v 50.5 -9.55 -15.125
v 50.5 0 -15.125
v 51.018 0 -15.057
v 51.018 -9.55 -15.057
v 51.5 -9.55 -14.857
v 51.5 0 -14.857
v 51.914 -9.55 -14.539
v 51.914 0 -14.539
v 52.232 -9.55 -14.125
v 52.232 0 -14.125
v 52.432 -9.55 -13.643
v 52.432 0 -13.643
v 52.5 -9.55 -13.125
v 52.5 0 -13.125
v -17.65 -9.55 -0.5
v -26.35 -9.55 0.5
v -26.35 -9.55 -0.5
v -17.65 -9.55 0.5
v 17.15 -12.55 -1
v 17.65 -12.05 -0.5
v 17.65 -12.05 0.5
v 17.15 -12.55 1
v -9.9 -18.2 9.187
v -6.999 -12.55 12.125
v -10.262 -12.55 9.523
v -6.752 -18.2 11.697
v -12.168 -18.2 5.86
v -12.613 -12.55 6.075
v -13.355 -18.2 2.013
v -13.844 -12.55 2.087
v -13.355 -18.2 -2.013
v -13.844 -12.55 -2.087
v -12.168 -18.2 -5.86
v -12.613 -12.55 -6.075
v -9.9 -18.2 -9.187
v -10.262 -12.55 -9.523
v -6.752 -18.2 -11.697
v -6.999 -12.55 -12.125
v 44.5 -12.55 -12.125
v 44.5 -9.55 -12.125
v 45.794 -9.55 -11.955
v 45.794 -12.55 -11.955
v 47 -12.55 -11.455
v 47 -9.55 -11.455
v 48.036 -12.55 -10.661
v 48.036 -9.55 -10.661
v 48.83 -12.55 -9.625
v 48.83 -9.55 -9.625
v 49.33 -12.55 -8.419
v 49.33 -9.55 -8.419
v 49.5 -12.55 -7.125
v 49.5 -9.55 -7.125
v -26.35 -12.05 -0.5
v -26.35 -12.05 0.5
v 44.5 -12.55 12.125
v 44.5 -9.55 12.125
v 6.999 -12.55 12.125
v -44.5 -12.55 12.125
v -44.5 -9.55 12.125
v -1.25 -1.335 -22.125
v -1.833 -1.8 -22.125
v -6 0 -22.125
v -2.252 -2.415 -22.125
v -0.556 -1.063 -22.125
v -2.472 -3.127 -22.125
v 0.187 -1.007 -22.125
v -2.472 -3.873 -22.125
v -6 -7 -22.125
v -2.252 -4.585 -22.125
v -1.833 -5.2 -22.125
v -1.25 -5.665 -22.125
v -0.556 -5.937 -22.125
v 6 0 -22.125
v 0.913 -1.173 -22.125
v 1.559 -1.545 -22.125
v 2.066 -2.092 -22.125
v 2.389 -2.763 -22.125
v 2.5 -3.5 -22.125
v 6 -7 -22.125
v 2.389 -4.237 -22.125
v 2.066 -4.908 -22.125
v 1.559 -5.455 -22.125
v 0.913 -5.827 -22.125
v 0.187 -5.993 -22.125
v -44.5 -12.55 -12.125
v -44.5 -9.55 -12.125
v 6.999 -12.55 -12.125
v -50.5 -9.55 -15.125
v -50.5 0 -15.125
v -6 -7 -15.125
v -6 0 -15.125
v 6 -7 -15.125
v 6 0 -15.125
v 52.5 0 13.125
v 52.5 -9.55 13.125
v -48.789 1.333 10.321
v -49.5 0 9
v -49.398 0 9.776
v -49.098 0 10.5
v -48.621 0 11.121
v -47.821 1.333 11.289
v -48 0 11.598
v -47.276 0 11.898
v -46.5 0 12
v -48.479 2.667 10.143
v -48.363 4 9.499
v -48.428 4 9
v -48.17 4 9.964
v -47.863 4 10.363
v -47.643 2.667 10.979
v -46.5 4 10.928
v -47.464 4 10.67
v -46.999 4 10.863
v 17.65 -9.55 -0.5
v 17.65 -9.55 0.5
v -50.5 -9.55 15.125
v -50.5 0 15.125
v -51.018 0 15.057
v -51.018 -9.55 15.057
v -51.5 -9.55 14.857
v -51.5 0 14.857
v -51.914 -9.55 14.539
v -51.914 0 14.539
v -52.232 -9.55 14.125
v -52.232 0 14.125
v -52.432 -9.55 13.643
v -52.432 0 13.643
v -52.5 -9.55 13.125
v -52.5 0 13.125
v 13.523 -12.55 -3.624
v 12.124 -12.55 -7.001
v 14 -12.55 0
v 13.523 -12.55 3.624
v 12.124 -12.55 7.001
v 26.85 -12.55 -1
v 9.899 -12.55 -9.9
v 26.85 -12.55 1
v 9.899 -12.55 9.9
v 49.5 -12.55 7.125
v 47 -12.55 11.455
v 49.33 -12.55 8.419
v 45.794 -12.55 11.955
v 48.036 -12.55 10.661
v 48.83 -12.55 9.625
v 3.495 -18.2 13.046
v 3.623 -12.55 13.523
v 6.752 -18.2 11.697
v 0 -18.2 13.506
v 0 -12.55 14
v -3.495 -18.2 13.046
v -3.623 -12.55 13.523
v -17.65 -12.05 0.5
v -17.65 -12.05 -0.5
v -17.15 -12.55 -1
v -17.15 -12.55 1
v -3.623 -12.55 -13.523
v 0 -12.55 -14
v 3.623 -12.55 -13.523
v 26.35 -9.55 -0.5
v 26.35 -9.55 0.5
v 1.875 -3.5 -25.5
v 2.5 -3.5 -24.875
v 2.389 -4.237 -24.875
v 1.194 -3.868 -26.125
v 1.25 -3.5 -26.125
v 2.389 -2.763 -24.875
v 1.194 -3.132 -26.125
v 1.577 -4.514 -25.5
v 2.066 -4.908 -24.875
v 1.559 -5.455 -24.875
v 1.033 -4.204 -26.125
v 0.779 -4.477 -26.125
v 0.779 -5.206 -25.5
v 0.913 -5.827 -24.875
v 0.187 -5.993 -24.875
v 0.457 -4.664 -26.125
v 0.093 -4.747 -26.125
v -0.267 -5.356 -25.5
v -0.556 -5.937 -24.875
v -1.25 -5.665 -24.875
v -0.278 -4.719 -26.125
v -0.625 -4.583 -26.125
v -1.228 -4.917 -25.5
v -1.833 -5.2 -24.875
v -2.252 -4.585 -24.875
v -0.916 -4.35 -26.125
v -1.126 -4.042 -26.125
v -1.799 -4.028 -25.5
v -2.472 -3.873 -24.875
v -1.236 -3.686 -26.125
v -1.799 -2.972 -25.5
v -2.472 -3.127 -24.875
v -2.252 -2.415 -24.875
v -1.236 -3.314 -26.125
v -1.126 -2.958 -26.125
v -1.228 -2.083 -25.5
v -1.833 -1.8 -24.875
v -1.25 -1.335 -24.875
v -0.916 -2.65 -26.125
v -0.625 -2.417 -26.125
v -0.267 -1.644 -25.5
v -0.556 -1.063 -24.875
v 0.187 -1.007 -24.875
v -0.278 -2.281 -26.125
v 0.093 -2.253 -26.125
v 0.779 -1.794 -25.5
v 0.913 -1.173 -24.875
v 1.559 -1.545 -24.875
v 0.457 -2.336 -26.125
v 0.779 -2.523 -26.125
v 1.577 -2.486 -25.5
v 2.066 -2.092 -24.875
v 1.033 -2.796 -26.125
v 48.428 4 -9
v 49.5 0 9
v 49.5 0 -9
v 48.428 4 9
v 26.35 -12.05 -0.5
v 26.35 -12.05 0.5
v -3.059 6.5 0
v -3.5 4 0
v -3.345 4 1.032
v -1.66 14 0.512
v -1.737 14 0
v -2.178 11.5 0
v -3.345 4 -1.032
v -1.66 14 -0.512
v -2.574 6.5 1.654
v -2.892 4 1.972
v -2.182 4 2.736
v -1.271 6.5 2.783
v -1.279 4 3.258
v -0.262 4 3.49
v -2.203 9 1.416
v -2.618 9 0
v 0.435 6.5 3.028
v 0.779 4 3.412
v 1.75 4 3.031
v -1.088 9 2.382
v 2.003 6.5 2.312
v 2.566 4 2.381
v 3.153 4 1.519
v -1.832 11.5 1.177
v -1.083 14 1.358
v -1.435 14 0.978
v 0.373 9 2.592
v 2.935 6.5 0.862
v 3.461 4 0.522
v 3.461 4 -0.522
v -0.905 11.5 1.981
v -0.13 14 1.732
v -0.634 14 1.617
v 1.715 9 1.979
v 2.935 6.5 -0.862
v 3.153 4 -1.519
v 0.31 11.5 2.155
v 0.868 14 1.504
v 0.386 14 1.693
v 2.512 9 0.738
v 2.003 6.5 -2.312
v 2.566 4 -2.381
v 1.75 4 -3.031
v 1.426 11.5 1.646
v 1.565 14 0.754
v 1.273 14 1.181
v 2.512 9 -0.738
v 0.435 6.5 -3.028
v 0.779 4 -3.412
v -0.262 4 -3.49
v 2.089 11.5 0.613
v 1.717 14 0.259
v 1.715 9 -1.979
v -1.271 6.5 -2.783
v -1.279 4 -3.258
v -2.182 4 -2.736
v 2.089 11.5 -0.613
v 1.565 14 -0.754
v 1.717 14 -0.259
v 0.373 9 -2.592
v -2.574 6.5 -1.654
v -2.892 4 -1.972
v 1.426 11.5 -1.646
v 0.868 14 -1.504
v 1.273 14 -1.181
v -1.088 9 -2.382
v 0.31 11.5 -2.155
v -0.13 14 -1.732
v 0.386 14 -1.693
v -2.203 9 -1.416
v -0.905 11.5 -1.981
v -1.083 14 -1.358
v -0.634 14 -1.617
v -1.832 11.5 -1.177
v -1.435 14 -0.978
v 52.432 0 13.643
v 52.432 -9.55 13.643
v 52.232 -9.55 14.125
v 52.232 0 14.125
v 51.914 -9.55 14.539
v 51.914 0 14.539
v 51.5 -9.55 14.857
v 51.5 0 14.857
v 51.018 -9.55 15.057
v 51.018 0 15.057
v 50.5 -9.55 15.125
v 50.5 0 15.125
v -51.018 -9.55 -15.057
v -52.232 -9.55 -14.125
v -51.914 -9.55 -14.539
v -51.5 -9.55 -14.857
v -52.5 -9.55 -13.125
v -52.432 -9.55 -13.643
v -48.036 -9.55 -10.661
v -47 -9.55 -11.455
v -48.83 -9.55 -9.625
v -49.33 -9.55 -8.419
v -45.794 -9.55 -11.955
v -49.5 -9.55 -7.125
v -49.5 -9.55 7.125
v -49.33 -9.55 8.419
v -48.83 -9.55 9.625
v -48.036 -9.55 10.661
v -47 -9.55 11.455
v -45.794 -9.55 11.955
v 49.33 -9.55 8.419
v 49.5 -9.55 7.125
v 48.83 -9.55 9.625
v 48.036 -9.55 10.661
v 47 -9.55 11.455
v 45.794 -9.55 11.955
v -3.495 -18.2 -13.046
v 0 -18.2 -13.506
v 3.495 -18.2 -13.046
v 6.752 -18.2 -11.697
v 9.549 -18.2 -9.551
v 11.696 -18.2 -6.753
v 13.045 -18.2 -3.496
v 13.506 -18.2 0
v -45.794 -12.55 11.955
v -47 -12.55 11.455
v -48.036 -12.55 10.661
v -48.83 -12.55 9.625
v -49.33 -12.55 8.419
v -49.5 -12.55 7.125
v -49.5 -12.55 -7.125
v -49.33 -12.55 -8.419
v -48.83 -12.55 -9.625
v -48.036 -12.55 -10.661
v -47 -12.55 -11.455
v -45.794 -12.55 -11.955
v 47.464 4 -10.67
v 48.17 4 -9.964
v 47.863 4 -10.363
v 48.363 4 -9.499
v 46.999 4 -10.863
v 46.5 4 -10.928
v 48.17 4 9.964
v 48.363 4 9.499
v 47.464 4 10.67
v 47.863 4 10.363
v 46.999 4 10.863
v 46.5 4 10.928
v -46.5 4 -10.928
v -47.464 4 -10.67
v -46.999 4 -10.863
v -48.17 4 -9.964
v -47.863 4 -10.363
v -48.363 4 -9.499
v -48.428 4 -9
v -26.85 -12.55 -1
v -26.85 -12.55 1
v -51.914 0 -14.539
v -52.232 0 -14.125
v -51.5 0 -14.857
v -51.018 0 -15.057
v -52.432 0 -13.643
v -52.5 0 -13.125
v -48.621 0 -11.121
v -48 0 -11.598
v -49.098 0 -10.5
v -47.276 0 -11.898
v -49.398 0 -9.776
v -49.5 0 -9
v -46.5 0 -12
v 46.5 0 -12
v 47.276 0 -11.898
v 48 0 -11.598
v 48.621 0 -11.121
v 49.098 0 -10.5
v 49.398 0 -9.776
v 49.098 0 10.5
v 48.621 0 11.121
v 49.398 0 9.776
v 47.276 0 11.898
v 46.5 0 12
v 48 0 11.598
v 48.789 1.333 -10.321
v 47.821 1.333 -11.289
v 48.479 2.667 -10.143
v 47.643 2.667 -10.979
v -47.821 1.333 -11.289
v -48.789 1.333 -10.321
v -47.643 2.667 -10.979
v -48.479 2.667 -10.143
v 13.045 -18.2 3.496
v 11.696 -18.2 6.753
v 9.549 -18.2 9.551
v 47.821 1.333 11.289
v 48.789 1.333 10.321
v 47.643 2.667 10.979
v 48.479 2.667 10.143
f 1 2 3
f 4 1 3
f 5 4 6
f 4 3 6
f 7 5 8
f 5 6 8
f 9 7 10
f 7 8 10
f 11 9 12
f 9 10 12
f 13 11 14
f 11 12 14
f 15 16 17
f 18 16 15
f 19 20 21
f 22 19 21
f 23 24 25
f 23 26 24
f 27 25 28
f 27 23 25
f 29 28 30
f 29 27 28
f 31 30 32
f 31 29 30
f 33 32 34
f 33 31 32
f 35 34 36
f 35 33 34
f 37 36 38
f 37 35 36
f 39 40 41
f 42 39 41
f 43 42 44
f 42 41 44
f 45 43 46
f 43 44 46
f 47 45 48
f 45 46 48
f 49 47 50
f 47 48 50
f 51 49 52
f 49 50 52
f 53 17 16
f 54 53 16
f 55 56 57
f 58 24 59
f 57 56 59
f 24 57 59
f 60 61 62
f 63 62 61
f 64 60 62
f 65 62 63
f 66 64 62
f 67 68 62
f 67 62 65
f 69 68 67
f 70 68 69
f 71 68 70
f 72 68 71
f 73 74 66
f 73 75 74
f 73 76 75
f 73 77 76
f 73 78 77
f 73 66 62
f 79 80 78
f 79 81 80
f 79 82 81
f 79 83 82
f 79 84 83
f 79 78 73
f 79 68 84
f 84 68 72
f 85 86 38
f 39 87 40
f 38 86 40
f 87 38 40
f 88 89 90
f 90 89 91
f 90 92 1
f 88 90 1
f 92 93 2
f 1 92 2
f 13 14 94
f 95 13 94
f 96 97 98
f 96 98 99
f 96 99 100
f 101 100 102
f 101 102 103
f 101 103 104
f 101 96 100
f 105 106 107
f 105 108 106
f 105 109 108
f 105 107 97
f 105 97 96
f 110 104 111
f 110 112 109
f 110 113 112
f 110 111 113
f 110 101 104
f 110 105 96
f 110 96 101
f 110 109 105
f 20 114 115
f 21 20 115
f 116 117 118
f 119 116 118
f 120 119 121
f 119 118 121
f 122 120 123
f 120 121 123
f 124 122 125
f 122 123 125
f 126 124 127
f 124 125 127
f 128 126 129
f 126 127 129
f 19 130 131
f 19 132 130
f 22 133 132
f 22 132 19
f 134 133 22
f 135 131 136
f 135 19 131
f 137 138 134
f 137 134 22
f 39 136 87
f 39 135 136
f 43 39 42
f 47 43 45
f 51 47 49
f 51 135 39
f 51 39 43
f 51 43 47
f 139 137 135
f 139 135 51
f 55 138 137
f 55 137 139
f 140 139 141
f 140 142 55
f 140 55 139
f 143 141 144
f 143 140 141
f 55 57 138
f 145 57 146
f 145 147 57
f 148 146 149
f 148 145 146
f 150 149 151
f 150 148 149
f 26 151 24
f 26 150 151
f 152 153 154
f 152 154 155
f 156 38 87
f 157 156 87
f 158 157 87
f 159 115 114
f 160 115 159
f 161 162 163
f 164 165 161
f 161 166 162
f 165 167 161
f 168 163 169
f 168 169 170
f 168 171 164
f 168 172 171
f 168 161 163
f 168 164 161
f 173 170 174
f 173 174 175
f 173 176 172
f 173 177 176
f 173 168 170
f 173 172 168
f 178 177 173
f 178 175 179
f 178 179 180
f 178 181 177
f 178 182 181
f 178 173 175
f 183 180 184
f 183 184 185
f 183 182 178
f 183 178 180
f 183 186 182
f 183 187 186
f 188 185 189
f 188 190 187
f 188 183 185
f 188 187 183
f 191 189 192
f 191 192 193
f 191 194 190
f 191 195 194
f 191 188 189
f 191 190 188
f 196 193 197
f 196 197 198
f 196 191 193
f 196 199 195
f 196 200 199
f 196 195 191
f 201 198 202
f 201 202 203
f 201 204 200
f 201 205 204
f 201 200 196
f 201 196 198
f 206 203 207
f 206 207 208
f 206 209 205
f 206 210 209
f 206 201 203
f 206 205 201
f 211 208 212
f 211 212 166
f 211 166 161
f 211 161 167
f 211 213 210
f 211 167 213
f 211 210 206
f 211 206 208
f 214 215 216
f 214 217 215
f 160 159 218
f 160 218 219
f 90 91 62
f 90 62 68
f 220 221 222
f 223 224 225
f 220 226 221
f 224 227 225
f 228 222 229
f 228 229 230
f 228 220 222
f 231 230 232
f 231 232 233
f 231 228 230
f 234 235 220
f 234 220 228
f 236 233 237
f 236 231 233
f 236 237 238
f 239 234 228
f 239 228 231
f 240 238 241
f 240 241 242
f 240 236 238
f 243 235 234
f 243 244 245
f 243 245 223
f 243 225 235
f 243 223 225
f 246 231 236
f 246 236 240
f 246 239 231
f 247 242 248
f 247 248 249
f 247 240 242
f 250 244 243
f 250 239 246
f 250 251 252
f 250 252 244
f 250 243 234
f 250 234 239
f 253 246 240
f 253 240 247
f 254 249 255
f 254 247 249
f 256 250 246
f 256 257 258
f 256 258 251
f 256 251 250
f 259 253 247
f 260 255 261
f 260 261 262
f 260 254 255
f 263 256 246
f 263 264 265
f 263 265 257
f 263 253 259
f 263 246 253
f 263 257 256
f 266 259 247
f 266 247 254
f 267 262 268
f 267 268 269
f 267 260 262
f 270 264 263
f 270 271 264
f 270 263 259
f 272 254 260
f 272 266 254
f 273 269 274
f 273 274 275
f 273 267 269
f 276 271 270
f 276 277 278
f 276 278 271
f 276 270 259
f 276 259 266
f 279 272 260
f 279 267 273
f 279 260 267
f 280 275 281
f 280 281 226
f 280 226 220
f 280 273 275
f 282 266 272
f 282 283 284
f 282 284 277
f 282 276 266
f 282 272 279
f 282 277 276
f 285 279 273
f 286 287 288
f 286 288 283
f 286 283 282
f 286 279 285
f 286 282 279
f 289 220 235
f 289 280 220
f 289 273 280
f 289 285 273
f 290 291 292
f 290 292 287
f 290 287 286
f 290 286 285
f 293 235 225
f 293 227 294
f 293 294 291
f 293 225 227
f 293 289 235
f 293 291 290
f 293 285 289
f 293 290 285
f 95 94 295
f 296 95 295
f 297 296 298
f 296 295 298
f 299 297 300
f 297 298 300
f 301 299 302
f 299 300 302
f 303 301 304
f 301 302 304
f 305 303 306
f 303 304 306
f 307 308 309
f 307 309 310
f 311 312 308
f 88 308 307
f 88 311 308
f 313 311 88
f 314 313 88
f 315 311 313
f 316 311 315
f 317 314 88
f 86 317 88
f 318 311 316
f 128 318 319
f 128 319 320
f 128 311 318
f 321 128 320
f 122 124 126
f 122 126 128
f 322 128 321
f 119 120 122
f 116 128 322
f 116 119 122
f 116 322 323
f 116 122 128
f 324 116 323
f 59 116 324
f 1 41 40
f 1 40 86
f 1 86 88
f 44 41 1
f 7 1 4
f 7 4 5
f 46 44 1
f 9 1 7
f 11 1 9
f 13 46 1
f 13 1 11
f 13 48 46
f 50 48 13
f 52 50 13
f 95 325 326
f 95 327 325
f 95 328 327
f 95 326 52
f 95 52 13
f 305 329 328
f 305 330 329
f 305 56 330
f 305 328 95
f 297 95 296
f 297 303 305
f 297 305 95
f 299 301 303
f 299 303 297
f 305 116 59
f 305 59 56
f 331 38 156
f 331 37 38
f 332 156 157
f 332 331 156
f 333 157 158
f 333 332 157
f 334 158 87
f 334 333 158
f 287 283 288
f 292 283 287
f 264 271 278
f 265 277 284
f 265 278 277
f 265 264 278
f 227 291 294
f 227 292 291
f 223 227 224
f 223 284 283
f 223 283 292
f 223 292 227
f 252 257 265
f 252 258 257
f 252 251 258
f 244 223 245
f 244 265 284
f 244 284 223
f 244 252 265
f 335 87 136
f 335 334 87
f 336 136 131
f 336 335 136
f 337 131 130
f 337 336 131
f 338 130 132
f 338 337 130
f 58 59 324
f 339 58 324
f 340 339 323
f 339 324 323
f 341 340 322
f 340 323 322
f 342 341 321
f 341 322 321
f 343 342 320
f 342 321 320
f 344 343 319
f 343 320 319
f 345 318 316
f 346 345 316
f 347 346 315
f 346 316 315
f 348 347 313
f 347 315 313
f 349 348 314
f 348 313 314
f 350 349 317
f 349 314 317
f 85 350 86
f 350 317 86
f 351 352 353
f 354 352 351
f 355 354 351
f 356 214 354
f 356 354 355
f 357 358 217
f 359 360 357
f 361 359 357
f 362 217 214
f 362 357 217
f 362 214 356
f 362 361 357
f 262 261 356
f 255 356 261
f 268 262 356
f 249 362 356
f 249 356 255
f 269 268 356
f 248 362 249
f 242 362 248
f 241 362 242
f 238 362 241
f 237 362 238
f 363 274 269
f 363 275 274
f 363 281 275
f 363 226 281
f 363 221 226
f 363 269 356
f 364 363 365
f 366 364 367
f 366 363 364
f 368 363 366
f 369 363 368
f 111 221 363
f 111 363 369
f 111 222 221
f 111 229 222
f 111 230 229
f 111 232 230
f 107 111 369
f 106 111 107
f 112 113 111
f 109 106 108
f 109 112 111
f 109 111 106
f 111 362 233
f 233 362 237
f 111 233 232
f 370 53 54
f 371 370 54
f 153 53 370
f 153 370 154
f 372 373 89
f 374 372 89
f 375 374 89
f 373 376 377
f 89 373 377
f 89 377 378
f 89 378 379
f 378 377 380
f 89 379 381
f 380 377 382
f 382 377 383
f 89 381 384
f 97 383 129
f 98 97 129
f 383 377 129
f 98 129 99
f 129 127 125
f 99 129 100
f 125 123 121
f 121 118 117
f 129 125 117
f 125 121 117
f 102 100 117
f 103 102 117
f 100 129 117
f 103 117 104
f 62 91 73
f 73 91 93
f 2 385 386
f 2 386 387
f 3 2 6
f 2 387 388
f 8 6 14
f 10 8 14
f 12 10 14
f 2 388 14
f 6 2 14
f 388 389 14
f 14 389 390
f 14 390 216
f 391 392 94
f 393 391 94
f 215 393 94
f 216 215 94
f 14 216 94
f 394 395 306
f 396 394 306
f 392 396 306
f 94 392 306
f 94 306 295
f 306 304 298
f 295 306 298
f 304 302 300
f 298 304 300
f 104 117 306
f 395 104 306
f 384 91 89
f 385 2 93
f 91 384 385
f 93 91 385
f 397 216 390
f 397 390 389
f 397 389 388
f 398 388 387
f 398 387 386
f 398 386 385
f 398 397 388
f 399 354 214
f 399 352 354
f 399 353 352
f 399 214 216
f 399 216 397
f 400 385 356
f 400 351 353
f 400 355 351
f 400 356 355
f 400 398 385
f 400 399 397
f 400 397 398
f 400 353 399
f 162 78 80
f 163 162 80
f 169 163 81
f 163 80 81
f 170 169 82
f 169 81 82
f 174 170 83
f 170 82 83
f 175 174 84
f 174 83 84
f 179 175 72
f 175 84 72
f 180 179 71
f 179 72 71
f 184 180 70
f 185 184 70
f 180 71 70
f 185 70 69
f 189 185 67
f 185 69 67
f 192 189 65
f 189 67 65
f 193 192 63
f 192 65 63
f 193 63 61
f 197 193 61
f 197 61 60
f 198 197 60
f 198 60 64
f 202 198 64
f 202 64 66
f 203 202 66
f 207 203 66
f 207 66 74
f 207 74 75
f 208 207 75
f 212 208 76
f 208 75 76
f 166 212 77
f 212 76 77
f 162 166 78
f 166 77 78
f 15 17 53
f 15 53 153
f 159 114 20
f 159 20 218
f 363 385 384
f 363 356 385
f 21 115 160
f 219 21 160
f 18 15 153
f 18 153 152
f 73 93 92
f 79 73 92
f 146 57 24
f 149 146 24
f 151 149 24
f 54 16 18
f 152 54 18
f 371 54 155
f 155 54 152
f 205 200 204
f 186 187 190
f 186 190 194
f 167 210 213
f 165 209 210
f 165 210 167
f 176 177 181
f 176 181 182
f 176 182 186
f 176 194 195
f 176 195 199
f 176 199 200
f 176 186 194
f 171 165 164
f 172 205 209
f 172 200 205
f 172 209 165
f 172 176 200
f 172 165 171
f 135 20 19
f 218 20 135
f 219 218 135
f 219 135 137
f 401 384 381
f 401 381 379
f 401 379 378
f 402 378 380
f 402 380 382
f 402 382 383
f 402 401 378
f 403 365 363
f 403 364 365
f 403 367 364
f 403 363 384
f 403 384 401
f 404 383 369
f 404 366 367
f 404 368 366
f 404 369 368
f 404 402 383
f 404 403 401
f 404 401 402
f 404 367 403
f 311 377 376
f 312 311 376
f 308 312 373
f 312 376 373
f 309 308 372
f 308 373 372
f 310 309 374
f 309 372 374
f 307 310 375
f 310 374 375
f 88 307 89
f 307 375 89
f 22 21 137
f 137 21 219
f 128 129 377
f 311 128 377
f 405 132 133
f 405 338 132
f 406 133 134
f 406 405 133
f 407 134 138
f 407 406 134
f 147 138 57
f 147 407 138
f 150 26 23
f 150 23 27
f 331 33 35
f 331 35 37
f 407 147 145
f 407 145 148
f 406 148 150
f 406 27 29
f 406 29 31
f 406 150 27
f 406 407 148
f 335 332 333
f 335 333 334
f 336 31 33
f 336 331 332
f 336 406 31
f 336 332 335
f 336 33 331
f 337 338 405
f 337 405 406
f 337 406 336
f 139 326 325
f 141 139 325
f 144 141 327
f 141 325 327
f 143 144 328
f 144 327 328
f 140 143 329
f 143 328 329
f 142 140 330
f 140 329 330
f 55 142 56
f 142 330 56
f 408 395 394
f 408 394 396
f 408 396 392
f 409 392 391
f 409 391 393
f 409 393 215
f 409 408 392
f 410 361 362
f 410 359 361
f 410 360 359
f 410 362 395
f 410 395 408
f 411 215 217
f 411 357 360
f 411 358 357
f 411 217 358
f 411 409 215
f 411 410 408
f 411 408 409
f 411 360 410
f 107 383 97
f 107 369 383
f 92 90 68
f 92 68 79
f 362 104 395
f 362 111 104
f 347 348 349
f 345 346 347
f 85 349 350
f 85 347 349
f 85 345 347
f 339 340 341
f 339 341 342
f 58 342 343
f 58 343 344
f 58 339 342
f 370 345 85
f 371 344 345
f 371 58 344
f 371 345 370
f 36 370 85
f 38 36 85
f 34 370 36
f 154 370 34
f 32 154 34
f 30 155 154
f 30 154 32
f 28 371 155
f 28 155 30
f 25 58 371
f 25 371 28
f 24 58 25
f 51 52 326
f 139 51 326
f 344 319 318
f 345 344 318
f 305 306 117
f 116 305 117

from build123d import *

# Parameters (mm, degrees)
F1_DEPTH  = 9.55
F2_W      = 8.7
F2_H      = 1
F3_DEPTH  = 3
F4_SIZE   = 0.5
F6_DEPTH  = 5.65
F6_TAPER  = 5
F8_DEPTH  = 4
F8_TAPER  = 15
F9_W      = 12
F9_H      = 7
F10_DEPTH = 7
F11_R     = 3.5
F12_DEPTH = 10
F12_TAPER = 10
F13_R     = 2.5
F14_DEPTH = 4
F15_SIZE  = 1.25


with BuildPart() as f1:
    # F0 (on Front) → F1 (new body)
    with BuildSketch(Plane.XZ):
        with BuildLine():
            Line((50.5, 15.125), (-50.5, 15.125))
            ThreePointArc((-50.5, 15.125), (-51.9142135624, 14.5392135624), (-52.5, 13.125))
            Line((-52.5, 13.125), (-52.5, -13.125))
            ThreePointArc((-52.5, -13.125), (-51.9142135624, -14.5392135624), (-50.5, -15.125))
            Line((-50.5, -15.125), (50.5, -15.125))
            ThreePointArc((50.5, -15.125), (51.9142135624, -14.5392135624), (52.5, -13.125))
            Line((52.5, -13.125), (52.5, 13.125))
            ThreePointArc((52.5, 13.125), (51.9142135624, 14.5392135624), (50.5, 15.125))
        make_face()
    extrude(amount=F1_DEPTH)

    # F2 (on face) → F3 (join)
    with BuildSketch(Plane.XZ.offset(9.55)):
        with BuildLine():
            Line((44.5, 12.125), (-44.5, 12.125))
            ThreePointArc((-44.5, 12.125), (-48.0355339059, 10.6605339059), (-49.5, 7.125))
            Line((-49.5, 7.125), (-49.5, -7.125))
            ThreePointArc((-49.5, -7.125), (-48.0355339059, -10.6605339059), (-44.5, -12.125))
            Line((-44.5, -12.125), (44.5, -12.125))
            ThreePointArc((44.5, -12.125), (48.0355339059, -10.6605339059), (49.5, -7.125))
            Line((49.5, -7.125), (49.5, 7.125))
            ThreePointArc((49.5, 7.125), (48.0355339059, 10.6605339059), (44.5, 12.125))
        make_face()
        with Locations((-22, 0)):
            Rectangle(F2_W, F2_H, mode=Mode.SUBTRACT)
        with Locations((22, 0)):
            Rectangle(F2_W, F2_H, mode=Mode.SUBTRACT)
    extrude(amount=F3_DEPTH)

    # F4
    f4_edges = [f1.edges().sort_by_distance(p)[0] for p in [
        (-22, -12.55, 0.5),
        (-17.65, -12.55, 0),
        (-22, -12.55, -0.5),
        (-26.35, -12.55, 0),
        (22, -12.55, -0.5),
        (17.65, -12.55, 0),
        (22, -12.55, 0.5),
        (26.35, -12.55, 0),
    ]]
    chamfer(f4_edges, length=F4_SIZE)

    # F5 (on face) → F6 (join)
    with BuildSketch(Plane.XZ.offset(12.55)):
        with BuildLine():
            ThreePointArc((6.9988838396, -12.125), (12.1240334409, -7.000558058), (14, 0))
            ThreePointArc((14, 0), (12.1240334409, 7.000558058), (6.9988838396, 12.125))
            Line((6.9988838396, 12.125), (-6.9988838396, 12.125))
            ThreePointArc((-6.9988838396, 12.125), (-14, 0), (-6.9988838396, -12.125))
            Line((-6.9988838396, -12.125), (6.9988838396, -12.125))
        make_face()
        with BuildLine():
            Line((-6.9988838396, 12.125), (6.9988838396, 12.125))
            ThreePointArc((6.9988838396, 12.125), (0, 14), (-6.9988838396, 12.125))
        make_face()
        with BuildLine():
            ThreePointArc((-6.9988838396, -12.125), (0, -14), (6.9988838396, -12.125))
            Line((6.9988838396, -12.125), (-6.9988838396, -12.125))
        make_face()
    extrude(amount=F6_DEPTH, taper=F6_TAPER)

    # F7 (on face) → F8 (join)
    with BuildSketch(Plane(origin=(0, 0, 0), x_dir=(-1, 0, 0), z_dir=(0, 1, 0))):
        with BuildLine():
            ThreePointArc((49.5, 9), (48.6213203436, 11.1213203436), (46.5, 12))
            Line((46.5, 12), (-46.5, 12))
            ThreePointArc((-46.5, 12), (-48.6213203436, 11.1213203436), (-49.5, 9))
            Line((-49.5, 9), (-49.5, -9))
            ThreePointArc((-49.5, -9), (-48.6213203436, -11.1213203436), (-46.5, -12))
            Line((-46.5, -12), (46.5, -12))
            ThreePointArc((46.5, -12), (48.6213203436, -11.1213203436), (49.5, -9))
            Line((49.5, -9), (49.5, 9))
        make_face()
    extrude(amount=F8_DEPTH, taper=F8_TAPER)

    # F9 (on face) → F10 (join)
    with BuildSketch(Plane(origin=(0, 0, -15.125), x_dir=(1, 0, 0), z_dir=(0, 0, -1))):
        with Locations((0, 3.5)):
            Rectangle(F9_W, F9_H)
    extrude(amount=F10_DEPTH)

    # F11 (on face) → F12 (join)
    with BuildSketch(Plane(origin=(0, 4, 0), x_dir=(-1, 0, 0), z_dir=(0, 1, 0))):
        Circle(F11_R)
    extrude(amount=F12_DEPTH, taper=F12_TAPER)

    # F13 (on face) → F14 (join)
    with BuildSketch(Plane(origin=(0, 0, -22.125), x_dir=(1, 0, 0), z_dir=(0, 0, -1))):
        with Locations((0, 3.5)):
            Circle(F13_R)
    extrude(amount=F14_DEPTH)

    # F15
    f15_edges = [f1.edges().sort_by_distance(p)[0] for p in [
        (-2.5, -3.5, -26.125),
    ]]
    chamfer(f15_edges, length=F15_SIZE)


solid = f1.part
